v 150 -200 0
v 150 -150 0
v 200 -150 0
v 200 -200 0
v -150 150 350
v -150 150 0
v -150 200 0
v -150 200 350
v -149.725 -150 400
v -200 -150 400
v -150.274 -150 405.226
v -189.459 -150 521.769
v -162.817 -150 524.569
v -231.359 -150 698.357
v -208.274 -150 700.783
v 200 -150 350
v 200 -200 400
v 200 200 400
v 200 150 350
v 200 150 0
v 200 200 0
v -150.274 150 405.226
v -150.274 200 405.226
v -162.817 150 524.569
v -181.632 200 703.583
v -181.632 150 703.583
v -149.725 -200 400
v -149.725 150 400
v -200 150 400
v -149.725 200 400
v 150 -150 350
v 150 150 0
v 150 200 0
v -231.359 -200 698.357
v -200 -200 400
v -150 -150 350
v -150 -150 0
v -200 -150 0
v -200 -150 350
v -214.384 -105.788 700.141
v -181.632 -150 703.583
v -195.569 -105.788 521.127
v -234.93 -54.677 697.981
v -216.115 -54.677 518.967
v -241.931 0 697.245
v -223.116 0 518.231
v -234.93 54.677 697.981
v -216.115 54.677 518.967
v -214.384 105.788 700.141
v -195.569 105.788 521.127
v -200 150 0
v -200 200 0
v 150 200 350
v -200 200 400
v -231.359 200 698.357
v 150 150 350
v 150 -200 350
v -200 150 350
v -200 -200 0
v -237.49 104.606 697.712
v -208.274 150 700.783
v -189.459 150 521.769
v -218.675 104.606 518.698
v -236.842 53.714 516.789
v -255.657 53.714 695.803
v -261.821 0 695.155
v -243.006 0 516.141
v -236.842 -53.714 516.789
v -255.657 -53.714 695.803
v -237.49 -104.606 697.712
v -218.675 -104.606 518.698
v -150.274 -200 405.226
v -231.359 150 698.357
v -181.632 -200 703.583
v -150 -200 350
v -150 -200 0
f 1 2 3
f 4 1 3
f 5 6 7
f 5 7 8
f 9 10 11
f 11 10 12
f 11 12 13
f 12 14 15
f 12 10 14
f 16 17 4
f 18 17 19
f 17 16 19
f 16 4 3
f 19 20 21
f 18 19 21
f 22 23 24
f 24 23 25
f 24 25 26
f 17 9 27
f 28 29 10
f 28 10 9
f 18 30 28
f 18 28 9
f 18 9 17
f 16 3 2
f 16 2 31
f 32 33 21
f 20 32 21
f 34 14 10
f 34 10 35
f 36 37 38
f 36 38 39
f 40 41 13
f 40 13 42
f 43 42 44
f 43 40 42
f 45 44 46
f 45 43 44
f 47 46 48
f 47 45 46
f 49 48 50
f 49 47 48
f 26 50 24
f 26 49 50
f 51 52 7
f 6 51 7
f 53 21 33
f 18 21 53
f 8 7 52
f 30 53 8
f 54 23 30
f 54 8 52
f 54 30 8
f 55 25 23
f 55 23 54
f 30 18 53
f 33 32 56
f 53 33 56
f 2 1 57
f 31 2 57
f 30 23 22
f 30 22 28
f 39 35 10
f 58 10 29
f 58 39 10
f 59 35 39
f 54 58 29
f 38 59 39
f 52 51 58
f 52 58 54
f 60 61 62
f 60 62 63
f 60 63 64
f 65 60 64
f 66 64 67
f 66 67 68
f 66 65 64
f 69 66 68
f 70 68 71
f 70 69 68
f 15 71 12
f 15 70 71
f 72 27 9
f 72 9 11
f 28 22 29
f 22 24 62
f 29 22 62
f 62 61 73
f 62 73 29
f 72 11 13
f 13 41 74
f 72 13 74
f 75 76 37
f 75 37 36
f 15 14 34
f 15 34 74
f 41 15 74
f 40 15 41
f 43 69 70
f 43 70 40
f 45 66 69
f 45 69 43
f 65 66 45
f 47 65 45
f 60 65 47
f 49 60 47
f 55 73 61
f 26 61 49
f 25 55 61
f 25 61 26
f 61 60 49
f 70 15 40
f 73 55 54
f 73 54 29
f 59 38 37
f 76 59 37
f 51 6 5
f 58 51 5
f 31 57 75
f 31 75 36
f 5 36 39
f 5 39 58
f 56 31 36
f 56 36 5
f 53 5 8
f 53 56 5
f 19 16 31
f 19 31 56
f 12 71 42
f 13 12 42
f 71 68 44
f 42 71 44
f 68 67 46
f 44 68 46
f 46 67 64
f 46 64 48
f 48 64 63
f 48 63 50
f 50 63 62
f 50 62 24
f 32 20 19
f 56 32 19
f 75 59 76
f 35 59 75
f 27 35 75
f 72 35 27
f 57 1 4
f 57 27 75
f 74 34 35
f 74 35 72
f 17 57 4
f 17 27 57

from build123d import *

# Parameters (mm, degrees)
F0_W      = 400
F0_H      = 400
F1_DEPTH  = 400
F2_W      = 300
F2_H      = 350
F3_DEPTH  = 400.001
F4_W      = 300
F4_H      = 350
F5_DEPTH  = 400.001
F10_W     = 400
F10_H     = 300
F11_DEPTH = 50
F12_W     = 300
F12_H     = 300
F13_DEPTH = 122.9991389297
F15_DEPTH = 50
F17_DEPTH = 50
F19_DEPTH = 180


with BuildPart() as f1:
    # F0 (on Top) → F1 (new body)
    with BuildSketch(Plane.XY):
        Rectangle(F0_W, F0_H)
    extrude(amount=F1_DEPTH)

    # F2 (on face) → F3 (cut, through all)
    with BuildSketch(Plane.XZ.offset(200)):
        with Locations((0, 175)):
            Rectangle(F2_W, F2_H)
    extrude(amount=-F3_DEPTH, mode=Mode.SUBTRACT)

    # F4 (on face) → F5 (cut, through all)
    with BuildSketch(Plane.YZ.offset(200)):
        with Locations((0, 175)):
            Rectangle(F4_W, F4_H)
    extrude(amount=-F5_DEPTH, mode=Mode.SUBTRACT)



with BuildPart() as f11:
    # F10 (on line) → F11 (new body)
    with BuildSketch(Plane(origin=(-156.2324219098, 0, -16.4206892285), x_dir=(0, -1, 0), z_dir=(-0.9945218954, 0, -0.1045284633))):
        with Locations((0, 568.7144508008)):
            Rectangle(F10_W, F10_H)
    extrude(amount=-F11_DEPTH)

    # F12 (on face) → F13 (cut, through all)
    with BuildSketch(Plane(origin=(-106.5063271414, 0, -11.1942660652), x_dir=(0, 1, 0), z_dir=(0.9945218954, 0, 0.1045284633))):
        with Locations((0, 568.7144508008)):
            Rectangle(F12_W, F12_H)
    extrude(amount=-F13_DEPTH, mode=Mode.SUBTRACT)


with BuildPart() as f1_1:
    add(f1.part)

    add(f11.part)  # F15 merges F11
    # F14 (on face) → F15 (join)
    with BuildSketch(Plane(origin=(0, 200, 0), x_dir=(-1, 0, 0), z_dir=(0, 1, 0))):
        Polygon((149.7245860218, 400), (200, 400), (150.2739052316, 405.2264231634), align=None)
    extrude(amount=-F15_DEPTH)

    # F16 (on face) → F17 (join)
    with BuildSketch(Plane.XZ.offset(200)):
        Polygon((-150.2739052316, 405.2264231634), (-200, 400), (-149.7245860218, 400), align=None)
    extrude(amount=-F17_DEPTH)

    # F18 (on face) → F19 (join)
    with BuildSketch(Plane(origin=(-75.1261170705, 0, 714.777257839), x_dir=(0.9945218954, 0, 0.1045284633), z_dir=(-0.1045284633, 0, 0.9945218954))):
        with BuildLine():
            ThreePointArc((-107.0929937666, -150), (-167.7233901133, 0), (-107.0929937666, 150))
            Line((-107.0929937666, 150), (-133.8813907821, 150))
            ThreePointArc((-133.8813907821, 150), (-187.7233901133, 0), (-133.8813907821, -150))
            Line((-133.8813907821, -150), (-107.0929937666, -150))
        make_face()
    extrude(amount=-F19_DEPTH)


solid = f1_1.part
